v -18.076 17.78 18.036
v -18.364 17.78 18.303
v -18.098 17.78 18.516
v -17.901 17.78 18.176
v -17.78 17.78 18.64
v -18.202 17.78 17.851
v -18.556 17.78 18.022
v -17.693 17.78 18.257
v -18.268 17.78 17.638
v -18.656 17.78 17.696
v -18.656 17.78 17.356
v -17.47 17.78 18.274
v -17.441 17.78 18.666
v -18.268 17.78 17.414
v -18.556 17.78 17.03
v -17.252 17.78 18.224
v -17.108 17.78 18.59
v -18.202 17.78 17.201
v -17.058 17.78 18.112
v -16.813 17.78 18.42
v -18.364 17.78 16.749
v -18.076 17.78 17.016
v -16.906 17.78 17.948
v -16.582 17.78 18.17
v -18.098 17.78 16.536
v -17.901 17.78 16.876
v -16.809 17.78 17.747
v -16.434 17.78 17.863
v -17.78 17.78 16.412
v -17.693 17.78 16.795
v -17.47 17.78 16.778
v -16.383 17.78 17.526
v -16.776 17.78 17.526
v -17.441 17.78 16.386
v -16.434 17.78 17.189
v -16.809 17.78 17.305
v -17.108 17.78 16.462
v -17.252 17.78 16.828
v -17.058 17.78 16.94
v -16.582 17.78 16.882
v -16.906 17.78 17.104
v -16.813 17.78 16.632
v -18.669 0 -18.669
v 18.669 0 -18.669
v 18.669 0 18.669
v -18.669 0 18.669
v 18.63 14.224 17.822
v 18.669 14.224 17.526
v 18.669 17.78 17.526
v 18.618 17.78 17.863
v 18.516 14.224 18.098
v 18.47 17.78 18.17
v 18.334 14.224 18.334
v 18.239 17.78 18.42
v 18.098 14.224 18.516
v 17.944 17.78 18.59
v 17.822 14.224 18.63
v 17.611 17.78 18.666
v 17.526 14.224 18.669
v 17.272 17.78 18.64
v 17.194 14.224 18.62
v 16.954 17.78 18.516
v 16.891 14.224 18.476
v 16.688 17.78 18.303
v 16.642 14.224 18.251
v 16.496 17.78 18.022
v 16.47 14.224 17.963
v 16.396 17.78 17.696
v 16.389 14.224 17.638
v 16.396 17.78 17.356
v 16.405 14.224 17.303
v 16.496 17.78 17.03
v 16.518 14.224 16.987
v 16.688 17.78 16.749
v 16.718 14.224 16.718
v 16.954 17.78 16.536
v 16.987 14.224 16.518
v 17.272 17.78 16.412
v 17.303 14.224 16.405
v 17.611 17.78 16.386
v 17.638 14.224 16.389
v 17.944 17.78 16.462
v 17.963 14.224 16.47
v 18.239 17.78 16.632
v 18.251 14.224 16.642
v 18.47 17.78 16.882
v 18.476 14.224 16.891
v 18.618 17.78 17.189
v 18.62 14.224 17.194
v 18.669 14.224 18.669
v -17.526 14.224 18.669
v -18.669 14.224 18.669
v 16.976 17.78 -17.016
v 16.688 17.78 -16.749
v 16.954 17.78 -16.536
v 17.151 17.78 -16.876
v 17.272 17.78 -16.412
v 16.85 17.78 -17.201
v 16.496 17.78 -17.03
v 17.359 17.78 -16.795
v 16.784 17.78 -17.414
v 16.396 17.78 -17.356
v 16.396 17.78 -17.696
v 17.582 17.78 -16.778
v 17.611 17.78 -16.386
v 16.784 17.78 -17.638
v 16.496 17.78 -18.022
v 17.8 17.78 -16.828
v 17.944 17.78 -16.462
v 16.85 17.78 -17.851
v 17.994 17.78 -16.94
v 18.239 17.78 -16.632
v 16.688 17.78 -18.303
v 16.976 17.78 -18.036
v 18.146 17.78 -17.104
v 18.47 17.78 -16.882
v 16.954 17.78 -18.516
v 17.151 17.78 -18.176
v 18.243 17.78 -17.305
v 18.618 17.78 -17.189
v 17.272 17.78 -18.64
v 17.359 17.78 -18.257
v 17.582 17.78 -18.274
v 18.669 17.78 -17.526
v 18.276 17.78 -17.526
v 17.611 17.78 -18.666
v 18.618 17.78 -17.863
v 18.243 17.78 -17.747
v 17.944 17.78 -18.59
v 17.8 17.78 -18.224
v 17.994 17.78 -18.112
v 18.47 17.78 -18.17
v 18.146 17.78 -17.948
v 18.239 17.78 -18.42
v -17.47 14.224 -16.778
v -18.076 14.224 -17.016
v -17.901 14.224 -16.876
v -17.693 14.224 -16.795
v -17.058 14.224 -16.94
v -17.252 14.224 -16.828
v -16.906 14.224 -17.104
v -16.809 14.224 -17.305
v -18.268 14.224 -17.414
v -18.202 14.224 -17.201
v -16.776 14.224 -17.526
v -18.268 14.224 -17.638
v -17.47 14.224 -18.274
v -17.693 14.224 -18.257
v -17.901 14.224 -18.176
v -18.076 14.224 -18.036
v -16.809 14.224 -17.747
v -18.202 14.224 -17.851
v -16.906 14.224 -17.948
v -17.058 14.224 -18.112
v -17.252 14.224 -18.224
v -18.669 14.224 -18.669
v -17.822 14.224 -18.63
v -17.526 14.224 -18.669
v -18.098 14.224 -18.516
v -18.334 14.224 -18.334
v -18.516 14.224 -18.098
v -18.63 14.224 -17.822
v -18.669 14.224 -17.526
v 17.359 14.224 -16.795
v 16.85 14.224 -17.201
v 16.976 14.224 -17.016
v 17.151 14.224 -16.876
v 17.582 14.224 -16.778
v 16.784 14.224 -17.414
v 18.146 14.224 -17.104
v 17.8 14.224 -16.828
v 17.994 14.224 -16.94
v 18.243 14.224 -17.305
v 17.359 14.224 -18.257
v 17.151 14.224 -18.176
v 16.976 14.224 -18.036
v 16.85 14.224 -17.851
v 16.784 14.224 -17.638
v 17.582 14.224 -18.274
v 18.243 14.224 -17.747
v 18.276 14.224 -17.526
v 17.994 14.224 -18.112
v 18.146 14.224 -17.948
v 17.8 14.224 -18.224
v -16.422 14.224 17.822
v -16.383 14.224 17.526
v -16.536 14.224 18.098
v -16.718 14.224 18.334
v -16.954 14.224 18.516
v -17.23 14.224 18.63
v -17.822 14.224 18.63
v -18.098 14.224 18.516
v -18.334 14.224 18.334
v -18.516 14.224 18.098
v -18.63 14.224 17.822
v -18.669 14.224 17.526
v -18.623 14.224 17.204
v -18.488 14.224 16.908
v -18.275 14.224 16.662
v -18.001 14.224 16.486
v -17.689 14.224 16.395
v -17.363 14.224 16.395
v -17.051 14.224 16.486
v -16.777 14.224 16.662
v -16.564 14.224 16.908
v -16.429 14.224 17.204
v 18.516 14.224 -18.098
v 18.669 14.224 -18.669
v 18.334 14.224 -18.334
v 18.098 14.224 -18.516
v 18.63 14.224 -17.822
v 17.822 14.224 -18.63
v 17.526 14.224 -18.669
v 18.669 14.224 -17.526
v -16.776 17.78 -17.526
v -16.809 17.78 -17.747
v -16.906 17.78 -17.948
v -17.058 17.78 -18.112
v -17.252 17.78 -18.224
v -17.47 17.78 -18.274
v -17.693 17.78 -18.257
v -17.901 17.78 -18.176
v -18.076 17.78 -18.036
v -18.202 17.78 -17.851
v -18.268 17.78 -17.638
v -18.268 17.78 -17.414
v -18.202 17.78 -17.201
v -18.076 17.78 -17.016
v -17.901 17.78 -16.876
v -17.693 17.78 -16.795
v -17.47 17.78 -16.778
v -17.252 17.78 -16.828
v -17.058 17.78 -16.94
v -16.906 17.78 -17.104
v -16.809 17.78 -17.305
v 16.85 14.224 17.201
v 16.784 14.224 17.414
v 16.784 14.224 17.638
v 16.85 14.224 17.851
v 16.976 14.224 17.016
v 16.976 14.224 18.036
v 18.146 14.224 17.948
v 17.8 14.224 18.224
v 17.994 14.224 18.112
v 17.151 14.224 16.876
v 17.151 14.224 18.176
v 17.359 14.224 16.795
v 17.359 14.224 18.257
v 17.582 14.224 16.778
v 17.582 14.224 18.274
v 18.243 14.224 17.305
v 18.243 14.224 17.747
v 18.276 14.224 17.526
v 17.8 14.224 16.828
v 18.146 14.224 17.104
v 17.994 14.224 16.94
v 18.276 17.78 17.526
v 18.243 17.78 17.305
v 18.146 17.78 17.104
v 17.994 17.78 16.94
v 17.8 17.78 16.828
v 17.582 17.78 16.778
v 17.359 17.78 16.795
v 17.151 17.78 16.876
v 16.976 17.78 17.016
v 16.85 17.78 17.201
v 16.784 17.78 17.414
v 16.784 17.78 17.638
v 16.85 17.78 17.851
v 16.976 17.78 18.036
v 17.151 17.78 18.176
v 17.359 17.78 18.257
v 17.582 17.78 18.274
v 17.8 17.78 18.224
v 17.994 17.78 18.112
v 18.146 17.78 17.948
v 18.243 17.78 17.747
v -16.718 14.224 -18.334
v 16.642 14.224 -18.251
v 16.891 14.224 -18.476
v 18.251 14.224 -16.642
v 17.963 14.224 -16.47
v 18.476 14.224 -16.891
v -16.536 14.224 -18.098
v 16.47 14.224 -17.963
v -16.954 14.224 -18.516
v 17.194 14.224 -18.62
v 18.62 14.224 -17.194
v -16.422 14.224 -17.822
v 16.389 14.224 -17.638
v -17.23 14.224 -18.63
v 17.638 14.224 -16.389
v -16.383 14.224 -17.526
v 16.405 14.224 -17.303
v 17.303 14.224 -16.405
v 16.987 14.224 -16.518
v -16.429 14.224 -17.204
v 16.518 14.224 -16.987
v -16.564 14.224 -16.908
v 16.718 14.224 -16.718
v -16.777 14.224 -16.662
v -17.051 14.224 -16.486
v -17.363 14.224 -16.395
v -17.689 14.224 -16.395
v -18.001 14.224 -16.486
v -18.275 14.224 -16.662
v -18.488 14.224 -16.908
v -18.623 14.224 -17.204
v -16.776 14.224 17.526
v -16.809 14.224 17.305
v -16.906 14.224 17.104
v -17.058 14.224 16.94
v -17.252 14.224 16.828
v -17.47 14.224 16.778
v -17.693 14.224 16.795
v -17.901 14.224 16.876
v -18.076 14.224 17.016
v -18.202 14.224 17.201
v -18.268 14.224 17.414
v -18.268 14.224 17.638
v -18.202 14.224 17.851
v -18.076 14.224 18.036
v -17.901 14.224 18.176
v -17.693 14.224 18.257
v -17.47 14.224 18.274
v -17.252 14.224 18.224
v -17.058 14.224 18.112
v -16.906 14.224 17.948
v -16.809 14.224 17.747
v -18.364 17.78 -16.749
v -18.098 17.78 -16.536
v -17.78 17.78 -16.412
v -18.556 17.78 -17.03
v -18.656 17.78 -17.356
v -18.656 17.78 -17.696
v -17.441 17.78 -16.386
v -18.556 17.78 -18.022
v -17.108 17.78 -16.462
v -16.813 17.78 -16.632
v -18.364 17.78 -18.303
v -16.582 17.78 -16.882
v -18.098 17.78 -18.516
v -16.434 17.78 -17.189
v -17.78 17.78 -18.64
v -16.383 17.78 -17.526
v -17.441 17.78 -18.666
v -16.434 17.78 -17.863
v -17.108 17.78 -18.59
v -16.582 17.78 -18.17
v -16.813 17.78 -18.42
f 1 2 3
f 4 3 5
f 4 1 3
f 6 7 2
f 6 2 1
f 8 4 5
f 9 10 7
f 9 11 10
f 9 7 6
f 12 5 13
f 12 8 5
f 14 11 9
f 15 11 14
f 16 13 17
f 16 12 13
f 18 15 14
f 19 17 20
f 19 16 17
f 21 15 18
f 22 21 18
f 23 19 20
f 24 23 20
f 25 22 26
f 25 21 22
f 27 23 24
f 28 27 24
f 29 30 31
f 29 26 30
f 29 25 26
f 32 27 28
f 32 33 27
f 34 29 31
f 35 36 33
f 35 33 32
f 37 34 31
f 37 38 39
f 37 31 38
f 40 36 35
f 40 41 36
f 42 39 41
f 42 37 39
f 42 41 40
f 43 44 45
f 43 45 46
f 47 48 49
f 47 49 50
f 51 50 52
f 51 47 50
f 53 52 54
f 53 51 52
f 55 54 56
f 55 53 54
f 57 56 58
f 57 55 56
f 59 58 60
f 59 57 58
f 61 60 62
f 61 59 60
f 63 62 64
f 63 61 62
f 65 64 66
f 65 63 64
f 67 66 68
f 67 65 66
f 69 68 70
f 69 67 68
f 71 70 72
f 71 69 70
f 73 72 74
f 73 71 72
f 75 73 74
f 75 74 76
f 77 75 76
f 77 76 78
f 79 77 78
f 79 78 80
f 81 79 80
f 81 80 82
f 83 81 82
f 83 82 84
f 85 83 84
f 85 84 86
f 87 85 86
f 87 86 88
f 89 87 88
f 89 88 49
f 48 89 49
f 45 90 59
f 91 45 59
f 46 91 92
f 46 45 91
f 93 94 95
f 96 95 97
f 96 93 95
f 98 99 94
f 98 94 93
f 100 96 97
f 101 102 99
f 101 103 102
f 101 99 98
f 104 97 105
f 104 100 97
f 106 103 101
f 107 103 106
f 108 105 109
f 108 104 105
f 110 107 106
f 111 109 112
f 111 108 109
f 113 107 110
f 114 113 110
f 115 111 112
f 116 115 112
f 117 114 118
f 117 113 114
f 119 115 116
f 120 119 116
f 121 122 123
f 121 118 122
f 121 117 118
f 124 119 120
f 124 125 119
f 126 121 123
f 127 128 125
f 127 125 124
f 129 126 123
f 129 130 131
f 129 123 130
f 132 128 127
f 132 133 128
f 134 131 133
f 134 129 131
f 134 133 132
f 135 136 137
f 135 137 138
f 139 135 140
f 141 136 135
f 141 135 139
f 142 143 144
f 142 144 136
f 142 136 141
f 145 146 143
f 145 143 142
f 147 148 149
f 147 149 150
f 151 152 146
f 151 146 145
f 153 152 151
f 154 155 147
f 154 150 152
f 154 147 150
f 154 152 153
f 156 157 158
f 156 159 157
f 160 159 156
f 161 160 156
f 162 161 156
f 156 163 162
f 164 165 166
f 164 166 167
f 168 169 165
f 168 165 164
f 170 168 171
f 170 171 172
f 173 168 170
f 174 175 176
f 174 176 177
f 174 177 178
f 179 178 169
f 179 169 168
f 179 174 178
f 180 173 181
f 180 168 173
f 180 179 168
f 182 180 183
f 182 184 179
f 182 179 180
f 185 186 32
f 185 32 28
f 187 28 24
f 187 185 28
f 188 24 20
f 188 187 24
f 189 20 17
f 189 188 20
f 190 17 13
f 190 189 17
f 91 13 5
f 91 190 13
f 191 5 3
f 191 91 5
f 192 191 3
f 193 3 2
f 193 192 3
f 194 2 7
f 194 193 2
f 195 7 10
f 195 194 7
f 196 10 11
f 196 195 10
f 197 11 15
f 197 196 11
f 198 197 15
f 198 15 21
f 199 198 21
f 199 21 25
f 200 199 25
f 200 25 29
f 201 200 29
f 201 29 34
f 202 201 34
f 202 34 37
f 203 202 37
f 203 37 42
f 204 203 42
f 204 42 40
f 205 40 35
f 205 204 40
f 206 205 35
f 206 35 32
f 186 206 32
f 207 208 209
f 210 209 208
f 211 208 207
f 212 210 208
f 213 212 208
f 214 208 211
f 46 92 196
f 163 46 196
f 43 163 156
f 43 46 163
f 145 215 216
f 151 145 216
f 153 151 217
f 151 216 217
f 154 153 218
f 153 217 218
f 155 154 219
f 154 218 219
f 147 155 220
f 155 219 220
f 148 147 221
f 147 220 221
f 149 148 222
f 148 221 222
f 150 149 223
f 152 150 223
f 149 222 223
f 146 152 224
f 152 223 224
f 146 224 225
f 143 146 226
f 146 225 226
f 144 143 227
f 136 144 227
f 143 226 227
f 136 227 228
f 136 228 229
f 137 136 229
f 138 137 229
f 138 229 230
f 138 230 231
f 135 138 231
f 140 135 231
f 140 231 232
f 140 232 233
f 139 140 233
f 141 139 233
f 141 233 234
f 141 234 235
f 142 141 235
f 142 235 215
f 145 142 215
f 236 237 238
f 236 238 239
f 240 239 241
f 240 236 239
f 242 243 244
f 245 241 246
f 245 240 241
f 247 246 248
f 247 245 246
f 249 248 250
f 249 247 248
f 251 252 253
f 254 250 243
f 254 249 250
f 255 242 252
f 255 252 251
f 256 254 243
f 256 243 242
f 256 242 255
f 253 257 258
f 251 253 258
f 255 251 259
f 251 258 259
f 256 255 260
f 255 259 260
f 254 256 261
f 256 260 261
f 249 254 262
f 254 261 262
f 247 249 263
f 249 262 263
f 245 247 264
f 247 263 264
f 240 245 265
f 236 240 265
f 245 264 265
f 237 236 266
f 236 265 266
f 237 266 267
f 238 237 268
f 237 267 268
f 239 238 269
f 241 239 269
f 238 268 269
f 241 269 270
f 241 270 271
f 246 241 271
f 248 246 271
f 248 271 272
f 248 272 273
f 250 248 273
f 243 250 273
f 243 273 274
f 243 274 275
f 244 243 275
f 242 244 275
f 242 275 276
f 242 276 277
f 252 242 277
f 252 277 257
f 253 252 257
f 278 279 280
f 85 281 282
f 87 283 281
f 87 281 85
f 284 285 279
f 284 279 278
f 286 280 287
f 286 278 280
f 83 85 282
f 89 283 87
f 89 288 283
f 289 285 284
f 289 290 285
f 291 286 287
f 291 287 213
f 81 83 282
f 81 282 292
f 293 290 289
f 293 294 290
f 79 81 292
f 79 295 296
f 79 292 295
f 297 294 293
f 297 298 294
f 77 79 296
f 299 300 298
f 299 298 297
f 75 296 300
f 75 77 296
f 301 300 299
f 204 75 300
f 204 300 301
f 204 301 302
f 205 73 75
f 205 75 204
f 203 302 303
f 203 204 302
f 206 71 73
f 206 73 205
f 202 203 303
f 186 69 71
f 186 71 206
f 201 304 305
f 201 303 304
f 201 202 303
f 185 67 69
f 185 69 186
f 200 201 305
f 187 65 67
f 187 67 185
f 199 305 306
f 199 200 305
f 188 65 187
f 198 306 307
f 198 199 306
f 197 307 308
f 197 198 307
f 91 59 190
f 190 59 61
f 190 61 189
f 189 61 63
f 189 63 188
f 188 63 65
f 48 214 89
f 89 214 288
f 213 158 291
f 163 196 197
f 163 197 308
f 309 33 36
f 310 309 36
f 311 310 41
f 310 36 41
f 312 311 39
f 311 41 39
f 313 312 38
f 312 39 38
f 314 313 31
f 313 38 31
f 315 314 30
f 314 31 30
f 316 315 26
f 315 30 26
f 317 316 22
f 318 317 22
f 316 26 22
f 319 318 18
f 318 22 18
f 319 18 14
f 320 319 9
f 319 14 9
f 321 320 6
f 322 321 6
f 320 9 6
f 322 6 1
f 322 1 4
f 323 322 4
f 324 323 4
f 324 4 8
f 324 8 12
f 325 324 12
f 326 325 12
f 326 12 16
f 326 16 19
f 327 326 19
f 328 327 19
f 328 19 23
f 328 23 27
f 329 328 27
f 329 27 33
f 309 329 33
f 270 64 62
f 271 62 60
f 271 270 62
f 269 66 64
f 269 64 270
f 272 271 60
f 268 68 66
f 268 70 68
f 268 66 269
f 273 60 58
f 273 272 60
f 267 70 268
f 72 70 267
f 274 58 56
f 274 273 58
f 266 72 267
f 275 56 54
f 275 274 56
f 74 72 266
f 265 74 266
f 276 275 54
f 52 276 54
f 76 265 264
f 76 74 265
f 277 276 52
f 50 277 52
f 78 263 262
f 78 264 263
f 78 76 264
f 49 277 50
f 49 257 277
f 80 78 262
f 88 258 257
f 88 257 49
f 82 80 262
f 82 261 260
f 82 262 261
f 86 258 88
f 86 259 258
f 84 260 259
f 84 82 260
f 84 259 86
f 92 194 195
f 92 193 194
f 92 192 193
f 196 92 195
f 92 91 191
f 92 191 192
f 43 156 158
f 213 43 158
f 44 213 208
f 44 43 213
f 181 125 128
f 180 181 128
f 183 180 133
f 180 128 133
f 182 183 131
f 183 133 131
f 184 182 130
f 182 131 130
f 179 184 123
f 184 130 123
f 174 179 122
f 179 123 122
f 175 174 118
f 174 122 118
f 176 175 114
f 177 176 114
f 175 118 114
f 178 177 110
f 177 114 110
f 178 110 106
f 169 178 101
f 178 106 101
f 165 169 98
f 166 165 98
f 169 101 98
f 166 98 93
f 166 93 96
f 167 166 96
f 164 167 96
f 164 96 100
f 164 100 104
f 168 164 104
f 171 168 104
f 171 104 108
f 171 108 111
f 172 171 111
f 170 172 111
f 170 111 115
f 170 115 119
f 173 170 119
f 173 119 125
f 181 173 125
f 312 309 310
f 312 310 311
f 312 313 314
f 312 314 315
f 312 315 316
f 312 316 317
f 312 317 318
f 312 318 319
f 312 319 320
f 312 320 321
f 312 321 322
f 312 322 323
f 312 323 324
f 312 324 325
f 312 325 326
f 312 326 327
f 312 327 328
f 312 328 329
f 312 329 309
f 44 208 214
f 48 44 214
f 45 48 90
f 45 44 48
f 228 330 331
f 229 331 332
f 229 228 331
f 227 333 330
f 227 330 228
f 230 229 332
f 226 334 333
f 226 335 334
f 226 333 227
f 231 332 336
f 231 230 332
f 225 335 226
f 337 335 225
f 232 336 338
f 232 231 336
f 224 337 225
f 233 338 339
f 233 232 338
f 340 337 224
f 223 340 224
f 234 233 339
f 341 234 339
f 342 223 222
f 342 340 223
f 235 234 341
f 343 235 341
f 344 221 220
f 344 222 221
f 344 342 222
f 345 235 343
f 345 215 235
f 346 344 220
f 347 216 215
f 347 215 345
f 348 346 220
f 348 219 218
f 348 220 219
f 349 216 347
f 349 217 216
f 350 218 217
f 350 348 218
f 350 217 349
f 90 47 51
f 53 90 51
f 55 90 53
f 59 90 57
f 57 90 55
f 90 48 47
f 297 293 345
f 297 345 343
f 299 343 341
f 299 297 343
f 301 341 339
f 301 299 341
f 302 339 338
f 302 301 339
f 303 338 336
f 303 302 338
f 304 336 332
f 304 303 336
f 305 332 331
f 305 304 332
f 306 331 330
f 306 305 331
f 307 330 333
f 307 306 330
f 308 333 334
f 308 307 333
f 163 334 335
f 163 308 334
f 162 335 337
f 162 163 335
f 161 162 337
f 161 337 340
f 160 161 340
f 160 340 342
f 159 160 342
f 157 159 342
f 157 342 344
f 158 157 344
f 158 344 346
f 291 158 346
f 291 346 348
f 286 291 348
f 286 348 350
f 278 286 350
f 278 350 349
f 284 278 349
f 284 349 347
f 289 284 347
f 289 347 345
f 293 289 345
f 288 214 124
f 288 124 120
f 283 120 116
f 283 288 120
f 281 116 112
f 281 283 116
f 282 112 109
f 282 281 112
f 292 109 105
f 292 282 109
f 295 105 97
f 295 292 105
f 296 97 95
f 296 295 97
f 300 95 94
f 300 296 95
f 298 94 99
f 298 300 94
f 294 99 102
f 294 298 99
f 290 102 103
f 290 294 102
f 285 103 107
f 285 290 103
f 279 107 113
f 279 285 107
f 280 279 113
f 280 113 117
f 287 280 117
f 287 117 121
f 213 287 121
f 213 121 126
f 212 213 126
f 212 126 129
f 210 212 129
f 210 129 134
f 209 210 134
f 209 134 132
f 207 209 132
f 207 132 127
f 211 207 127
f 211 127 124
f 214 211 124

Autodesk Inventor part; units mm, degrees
ref_plane "YZ Plane" through (0, 0, 0) normal (1, 0, 0) x (0, 1, 0)
ref_plane "XZ Plane" through (0, 0, 0) normal (0, 1, 0) x (-1, 0, 0)
ref_plane "XY Plane" through (0, 0, 0) normal (0, 0, 1) x (1, 0, 0)
sketch "Sketch1" plane through (0, 0, 0) normal (0, 1, 0) x (-1, 0, 0)
  line L0 (-18.669, 18.669) -> (18.669, 18.669)
  line L1 (18.669, 18.669) -> (18.669, -18.669)
  line L2 (18.669, -18.669) -> (-18.669, -18.669)
  line L3 (-18.669, -18.669) -> (-18.669, 18.669)
  line L4 (-18.669, 18.669) -> (18.669, -18.669) construction
  line L5 (18.669, 18.669) -> (-18.669, -18.669) construction
  point P0 (0, 0)
  dimension "d0" = 37.338
extrude "Extrusion1" add sketch "Sketch1" along normal blind 14.224
sketch "Sketch2" plane through (18.669, 0, 18.669) normal (1, 0, 0) x (0, 0, -1)
  point P0 (18.669, 0)
sketch "Sketch3" plane through (0, 14.224, 0) normal (0, 1, 0) x (1, 0, 0)
  circle A0 centre (-17.526, -17.526) radius 1.143
  line L0 (-18.669, 18.669) -> (-18.669, -18.669) projected
  line L1 (-18.669, -18.669) -> (18.669, -18.669) projected
  circle A1 centre (-17.526, 17.526) radius 1.143
  circle A2 centre (17.526, 17.526) radius 1.143
  circle A3 centre (17.526, -17.526) radius 1.143
  line L2 (18.669, 18.669) -> (-18.669, 18.669) projected
  line L3 (18.669, -18.669) -> (18.669, 18.669) projected
  point P0 (0, 0)
  dimension "d3" = 2.286
  dimension "d4" = 2.286
  dimension "d5" = 2.286
  dimension "d6" = 2.286
extrude "Extrusion2" add sketch "Sketch3" along normal blind 3.556 contours A0 | A1 | A3 | A2
sketch "Sketch4" plane through (-17.526, 17.78, 17.526) normal (0, 1, 0) x (1, 0, 0)
  circle A0 centre (0, 0) radius 0.75
  circle A1 centre (35.052, 0) radius 0.75
  circle A2 centre (35.052, 35.052) radius 0.75
  circle A3 centre (0, 35.052) radius 0.75
  point P0 (17.526, 17.526)
  dimension "d9" = 1.5
  dimension "d10" = 1.5
  dimension "d11" = 1.5
  dimension "d12" = 1.5
extrude "Extrusion3" cut sketch "Sketch4" against normal blind 3.556
properties part number "Sensor_Release_Magnet"
